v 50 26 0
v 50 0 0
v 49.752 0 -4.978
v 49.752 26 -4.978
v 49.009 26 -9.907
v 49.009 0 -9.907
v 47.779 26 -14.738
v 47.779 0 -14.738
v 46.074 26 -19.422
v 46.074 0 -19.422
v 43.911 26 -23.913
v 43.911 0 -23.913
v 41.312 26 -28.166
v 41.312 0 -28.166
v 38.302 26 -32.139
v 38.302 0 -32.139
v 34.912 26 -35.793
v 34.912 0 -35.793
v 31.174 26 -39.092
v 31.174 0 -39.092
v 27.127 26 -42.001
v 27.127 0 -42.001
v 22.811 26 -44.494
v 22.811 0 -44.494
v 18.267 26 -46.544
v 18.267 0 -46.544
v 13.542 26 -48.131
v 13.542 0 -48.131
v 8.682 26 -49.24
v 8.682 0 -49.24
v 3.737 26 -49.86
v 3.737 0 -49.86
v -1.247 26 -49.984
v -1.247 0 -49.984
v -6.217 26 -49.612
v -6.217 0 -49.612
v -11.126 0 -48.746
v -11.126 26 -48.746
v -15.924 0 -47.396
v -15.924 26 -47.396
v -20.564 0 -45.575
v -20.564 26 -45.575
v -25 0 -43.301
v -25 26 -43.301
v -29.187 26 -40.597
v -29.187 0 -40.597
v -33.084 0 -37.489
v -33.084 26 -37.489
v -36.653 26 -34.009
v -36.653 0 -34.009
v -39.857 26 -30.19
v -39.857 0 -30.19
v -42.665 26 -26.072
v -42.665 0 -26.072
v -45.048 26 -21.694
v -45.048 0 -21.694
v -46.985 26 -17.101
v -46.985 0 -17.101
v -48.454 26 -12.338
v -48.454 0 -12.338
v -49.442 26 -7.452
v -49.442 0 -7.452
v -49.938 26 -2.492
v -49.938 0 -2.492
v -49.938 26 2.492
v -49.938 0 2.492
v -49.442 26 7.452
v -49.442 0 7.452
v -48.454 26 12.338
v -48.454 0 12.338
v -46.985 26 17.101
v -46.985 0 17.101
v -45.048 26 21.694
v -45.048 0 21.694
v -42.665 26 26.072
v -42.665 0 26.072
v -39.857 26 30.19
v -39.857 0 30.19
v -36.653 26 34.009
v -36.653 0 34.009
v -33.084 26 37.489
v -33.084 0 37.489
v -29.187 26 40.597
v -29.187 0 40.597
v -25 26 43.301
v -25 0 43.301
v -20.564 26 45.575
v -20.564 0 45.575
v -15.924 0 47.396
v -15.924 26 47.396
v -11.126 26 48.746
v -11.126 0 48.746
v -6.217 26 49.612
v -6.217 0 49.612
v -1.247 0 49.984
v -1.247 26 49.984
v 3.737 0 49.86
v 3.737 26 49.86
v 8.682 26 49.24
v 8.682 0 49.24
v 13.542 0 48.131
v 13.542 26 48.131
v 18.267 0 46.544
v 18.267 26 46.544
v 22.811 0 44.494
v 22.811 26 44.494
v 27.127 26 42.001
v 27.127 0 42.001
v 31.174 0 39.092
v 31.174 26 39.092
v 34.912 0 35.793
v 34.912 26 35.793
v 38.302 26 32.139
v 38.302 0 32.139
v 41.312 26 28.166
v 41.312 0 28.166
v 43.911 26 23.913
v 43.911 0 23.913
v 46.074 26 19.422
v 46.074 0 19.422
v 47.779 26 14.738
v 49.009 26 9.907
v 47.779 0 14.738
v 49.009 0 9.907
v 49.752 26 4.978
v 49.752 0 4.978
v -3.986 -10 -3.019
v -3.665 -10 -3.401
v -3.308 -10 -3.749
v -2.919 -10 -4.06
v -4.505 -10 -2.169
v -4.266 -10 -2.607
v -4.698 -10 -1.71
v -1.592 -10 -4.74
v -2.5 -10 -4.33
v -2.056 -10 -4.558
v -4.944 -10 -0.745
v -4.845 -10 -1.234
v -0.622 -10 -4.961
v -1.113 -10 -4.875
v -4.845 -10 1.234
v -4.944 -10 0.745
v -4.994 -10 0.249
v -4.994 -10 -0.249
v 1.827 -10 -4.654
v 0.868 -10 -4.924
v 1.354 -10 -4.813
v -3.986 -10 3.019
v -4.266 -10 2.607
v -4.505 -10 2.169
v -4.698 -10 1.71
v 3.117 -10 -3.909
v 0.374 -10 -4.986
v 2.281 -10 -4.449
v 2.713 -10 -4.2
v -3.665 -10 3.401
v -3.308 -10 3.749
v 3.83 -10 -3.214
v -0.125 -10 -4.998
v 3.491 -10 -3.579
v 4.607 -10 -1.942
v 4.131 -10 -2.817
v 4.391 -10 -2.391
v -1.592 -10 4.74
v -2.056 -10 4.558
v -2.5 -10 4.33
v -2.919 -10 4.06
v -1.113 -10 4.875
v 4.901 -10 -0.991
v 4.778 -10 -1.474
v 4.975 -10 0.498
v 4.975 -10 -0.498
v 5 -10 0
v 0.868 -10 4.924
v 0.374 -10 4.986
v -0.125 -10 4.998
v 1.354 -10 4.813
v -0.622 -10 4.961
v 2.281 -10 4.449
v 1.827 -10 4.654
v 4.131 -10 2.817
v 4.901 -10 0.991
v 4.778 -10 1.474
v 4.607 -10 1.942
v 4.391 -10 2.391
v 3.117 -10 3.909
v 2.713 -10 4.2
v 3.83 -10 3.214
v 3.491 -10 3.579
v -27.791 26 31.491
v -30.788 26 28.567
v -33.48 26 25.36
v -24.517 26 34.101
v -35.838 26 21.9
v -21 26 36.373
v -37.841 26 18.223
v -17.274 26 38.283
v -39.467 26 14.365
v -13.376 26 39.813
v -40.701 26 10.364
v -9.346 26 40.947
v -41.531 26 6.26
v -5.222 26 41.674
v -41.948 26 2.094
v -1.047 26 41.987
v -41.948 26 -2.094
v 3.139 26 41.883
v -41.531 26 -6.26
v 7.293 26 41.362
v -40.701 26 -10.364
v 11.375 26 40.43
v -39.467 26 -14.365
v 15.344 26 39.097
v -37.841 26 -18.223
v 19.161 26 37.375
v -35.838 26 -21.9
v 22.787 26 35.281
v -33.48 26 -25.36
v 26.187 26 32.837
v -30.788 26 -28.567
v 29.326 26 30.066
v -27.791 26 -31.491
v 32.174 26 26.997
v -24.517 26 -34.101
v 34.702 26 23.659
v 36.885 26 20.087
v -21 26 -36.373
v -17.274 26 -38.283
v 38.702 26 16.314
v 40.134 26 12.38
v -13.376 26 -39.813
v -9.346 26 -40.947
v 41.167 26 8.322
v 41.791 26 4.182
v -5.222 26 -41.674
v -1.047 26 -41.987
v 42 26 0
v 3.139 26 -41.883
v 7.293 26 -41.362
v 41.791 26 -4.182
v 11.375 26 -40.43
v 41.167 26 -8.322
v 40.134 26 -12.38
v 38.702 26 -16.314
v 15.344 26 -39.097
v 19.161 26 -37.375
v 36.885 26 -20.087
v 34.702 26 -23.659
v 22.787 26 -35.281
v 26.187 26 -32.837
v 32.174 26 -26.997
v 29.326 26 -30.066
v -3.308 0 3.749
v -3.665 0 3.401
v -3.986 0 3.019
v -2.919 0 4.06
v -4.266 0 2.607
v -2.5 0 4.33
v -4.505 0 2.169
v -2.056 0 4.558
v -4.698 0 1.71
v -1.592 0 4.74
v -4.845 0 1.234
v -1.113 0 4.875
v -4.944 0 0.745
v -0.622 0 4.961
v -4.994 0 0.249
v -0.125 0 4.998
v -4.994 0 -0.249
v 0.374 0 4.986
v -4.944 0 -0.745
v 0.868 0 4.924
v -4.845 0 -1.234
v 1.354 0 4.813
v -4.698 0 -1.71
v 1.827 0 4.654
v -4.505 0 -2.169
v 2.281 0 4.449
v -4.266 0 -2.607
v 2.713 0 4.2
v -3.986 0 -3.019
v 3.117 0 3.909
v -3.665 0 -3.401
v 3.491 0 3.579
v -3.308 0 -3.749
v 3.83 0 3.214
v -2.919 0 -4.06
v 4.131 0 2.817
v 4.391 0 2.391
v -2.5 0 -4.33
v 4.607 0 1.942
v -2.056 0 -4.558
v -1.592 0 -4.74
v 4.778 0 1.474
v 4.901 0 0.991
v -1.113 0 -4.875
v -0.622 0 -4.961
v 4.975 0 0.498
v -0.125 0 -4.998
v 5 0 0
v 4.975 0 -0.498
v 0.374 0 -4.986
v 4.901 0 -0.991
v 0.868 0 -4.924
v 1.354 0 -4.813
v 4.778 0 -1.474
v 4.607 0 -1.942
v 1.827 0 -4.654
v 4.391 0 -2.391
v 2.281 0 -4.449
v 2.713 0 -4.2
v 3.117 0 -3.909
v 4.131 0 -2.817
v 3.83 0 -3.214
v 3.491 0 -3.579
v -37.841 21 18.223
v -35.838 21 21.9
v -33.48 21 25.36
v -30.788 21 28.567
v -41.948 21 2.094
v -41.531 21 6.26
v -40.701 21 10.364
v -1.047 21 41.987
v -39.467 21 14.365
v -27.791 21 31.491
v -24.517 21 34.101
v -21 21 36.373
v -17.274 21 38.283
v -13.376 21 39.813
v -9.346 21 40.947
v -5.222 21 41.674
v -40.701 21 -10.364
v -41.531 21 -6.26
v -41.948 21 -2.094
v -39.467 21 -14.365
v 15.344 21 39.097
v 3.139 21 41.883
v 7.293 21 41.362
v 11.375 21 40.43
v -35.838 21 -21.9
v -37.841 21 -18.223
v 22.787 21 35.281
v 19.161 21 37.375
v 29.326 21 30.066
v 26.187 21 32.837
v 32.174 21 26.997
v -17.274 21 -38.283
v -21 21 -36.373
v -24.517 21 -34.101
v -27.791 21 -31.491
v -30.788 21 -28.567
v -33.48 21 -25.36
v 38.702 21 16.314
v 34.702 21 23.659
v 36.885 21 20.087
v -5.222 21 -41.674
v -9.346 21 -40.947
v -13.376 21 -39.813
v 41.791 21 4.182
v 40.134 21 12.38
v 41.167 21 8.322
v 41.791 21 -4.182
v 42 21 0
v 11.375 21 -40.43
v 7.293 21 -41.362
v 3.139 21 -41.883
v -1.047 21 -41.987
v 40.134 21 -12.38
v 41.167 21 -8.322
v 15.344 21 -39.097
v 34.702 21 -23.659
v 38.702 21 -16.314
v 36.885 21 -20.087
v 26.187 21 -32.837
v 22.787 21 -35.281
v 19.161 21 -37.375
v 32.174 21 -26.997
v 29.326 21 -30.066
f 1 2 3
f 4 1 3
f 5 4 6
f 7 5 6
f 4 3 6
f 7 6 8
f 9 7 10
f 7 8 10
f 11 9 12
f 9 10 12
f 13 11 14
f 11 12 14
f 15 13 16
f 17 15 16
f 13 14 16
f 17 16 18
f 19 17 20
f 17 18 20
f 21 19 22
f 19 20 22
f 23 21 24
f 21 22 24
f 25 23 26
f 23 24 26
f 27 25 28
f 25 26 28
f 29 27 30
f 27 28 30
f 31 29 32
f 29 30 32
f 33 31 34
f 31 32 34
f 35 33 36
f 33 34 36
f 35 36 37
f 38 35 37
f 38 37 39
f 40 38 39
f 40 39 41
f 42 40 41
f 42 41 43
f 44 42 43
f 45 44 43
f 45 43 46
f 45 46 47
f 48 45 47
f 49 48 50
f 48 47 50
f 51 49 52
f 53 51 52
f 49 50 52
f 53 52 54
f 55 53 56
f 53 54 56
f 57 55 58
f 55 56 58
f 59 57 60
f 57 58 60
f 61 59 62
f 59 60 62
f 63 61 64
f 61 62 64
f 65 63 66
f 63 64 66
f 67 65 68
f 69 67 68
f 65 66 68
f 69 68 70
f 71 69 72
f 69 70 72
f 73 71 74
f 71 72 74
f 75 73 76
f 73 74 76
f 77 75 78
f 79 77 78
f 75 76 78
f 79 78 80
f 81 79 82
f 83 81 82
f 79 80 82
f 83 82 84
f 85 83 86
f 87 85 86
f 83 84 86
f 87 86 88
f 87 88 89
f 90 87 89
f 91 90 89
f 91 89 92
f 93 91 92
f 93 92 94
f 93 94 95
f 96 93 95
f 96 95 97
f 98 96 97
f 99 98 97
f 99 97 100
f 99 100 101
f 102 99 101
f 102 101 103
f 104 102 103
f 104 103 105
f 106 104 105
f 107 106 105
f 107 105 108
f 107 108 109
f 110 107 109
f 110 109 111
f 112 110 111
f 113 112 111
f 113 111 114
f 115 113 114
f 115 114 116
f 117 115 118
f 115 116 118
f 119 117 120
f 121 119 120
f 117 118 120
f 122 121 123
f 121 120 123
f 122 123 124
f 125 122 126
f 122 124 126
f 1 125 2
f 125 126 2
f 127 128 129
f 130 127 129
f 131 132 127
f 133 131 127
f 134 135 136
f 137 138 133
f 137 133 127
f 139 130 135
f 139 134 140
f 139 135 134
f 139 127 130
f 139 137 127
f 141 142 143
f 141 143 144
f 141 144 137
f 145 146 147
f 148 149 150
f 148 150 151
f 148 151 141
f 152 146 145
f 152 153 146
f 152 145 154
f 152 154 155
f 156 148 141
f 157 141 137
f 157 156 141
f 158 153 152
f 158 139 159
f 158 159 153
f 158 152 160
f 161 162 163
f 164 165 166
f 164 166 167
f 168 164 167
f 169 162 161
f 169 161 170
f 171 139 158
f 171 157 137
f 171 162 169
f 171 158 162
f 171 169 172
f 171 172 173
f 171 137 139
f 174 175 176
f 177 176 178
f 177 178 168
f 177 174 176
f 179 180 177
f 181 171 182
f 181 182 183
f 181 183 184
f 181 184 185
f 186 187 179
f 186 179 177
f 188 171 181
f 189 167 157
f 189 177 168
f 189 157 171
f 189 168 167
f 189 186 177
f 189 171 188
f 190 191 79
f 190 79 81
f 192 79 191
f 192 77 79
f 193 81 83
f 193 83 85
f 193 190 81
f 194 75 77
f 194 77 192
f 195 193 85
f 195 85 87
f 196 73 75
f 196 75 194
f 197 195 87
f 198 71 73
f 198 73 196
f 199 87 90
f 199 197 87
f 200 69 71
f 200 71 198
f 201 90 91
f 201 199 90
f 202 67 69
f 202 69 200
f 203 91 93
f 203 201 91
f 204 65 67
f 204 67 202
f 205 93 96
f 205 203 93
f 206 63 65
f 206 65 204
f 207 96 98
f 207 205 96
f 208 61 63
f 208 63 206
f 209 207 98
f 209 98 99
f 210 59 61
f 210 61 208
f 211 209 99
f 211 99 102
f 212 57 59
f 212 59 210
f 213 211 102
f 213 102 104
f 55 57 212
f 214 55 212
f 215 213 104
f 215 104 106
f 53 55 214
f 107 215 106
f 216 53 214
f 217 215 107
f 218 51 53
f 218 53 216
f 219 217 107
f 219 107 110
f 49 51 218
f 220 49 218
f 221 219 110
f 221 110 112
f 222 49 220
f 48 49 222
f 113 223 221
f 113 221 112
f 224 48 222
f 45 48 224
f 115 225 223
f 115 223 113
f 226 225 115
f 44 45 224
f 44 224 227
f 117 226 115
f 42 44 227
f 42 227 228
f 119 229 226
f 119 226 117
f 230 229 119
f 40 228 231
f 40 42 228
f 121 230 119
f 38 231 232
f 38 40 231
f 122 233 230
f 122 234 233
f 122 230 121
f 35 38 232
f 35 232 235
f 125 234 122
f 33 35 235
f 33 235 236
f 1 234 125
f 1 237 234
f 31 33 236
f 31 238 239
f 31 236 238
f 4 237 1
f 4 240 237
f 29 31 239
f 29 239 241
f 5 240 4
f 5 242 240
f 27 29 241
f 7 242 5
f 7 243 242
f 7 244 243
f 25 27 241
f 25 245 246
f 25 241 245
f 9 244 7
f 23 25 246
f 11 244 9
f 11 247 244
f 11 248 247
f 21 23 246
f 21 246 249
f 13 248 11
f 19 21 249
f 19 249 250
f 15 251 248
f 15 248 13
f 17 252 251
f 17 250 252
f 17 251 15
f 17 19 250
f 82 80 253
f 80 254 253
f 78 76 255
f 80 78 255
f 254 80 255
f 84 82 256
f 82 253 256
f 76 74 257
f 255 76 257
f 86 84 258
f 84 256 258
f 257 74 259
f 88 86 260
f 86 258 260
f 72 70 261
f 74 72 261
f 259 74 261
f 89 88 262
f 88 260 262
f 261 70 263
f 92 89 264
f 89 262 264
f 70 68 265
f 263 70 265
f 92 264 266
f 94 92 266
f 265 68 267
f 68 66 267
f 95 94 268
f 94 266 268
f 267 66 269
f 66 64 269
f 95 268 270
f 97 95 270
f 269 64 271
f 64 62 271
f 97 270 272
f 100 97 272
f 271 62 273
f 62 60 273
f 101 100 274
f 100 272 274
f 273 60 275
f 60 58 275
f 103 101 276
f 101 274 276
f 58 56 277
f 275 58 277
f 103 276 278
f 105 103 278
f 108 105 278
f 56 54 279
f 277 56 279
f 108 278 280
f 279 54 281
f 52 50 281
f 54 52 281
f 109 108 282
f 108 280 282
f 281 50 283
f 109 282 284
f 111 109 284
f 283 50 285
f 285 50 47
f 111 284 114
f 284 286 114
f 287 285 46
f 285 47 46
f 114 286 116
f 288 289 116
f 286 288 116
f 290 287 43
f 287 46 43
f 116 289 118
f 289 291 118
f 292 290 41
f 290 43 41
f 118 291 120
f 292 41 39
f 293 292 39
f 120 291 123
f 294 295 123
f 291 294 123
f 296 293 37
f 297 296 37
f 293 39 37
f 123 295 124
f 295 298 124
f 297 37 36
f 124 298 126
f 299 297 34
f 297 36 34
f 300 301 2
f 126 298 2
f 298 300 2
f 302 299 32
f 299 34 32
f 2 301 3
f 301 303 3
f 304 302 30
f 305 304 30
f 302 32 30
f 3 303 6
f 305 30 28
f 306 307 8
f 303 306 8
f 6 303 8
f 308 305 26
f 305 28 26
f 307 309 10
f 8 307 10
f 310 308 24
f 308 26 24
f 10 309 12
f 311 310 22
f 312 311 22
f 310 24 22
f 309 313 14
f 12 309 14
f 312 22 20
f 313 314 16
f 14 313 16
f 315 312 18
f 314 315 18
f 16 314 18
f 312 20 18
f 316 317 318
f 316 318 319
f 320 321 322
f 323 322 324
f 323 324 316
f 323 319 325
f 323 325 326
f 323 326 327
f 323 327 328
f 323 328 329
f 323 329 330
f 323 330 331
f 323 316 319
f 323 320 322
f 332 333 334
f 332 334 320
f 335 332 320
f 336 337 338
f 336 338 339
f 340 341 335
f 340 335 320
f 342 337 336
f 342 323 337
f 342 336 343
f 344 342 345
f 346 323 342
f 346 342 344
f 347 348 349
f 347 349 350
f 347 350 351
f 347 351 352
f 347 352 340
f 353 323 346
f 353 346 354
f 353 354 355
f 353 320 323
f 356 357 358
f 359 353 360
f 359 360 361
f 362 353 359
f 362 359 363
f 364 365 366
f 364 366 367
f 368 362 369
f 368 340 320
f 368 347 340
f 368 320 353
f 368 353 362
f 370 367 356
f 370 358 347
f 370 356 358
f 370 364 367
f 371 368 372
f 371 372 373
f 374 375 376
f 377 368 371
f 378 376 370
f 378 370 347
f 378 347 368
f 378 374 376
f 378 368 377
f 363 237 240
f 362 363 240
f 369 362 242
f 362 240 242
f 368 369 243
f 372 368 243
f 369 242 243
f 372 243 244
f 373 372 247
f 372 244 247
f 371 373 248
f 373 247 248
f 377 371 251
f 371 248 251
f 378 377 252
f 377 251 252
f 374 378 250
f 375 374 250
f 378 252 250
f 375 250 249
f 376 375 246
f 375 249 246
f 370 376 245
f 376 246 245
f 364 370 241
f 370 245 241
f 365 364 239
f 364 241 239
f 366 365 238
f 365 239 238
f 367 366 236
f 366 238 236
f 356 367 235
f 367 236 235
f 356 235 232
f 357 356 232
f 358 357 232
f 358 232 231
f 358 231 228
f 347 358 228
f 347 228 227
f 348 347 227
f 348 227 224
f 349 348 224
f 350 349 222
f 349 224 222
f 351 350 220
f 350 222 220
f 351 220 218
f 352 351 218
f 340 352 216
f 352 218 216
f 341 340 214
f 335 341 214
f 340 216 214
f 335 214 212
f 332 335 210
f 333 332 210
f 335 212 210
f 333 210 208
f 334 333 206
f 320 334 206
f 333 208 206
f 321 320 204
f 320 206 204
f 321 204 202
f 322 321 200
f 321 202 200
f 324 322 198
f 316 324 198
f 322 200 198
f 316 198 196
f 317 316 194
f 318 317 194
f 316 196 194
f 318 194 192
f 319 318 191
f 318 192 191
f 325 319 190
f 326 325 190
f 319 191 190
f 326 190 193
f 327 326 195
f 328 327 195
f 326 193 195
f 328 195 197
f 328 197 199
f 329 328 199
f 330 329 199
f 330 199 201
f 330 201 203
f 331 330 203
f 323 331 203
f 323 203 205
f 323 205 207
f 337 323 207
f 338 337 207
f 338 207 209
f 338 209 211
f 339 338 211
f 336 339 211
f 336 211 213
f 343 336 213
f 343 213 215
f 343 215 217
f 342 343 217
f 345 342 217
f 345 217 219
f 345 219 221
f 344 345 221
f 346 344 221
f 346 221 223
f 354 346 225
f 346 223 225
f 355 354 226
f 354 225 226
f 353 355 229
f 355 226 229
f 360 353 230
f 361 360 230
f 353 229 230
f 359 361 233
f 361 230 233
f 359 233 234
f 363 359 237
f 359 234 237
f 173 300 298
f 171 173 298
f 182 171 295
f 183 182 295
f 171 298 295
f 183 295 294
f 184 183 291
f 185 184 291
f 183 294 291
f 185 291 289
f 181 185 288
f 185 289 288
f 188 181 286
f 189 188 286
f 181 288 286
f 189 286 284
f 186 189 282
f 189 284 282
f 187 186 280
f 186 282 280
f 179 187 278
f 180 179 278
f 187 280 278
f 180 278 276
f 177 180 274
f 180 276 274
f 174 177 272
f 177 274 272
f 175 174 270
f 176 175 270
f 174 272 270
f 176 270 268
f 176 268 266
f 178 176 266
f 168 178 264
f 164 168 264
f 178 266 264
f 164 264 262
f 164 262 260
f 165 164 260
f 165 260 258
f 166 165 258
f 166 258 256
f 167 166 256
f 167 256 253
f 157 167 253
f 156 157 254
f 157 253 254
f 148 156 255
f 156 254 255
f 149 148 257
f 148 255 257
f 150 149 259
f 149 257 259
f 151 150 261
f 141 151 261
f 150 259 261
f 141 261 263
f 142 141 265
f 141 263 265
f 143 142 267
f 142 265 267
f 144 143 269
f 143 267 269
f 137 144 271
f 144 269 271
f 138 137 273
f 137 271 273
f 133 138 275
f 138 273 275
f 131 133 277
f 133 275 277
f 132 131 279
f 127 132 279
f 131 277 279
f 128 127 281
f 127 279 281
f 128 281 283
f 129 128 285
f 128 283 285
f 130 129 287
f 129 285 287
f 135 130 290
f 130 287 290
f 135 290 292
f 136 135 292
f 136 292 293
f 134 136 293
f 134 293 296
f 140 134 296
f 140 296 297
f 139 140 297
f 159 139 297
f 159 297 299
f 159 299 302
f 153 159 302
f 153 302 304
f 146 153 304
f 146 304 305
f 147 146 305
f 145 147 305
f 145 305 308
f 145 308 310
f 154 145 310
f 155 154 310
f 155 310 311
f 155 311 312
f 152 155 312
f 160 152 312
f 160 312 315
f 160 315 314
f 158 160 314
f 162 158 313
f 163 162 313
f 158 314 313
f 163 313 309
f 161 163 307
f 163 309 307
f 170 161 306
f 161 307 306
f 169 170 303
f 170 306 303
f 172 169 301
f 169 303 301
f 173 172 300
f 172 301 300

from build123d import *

# Parameters (mm, degrees)
SKETCH1_R                       = 50
BOSS_EXTRUDE1_DEPTH             = 26
SKETCH2_R                       = 42
CUT_EXTRUDE1_DEPTH              = 5
SKETCH3_R                       = 5
HUB_DISTANCE_TO_WORK_WITH_DEPTH = 10


with BuildPart() as part:
    # Sketch1 → Boss-Extrude1 (new body)
    with BuildSketch(Plane(origin=(0, 0, 0), x_dir=(1, 0, 0), z_dir=(0, 1, 0))):
        Circle(SKETCH1_R)
    extrude(amount=BOSS_EXTRUDE1_DEPTH)

    # Sketch2 → Cut-Extrude1 (cut)
    with BuildSketch(Plane(origin=(0, 26, 0), x_dir=(1, 0, 0), z_dir=(0, 1, 0))):
        Circle(SKETCH2_R)
    extrude(amount=-CUT_EXTRUDE1_DEPTH, mode=Mode.SUBTRACT)

    # Sketch3 → hub_distance_to_work_with (add)
    with BuildSketch(Plane.XZ):
        Circle(SKETCH3_R)
    extrude(amount=HUB_DISTANCE_TO_WORK_WITH_DEPTH)


solid = part.part
